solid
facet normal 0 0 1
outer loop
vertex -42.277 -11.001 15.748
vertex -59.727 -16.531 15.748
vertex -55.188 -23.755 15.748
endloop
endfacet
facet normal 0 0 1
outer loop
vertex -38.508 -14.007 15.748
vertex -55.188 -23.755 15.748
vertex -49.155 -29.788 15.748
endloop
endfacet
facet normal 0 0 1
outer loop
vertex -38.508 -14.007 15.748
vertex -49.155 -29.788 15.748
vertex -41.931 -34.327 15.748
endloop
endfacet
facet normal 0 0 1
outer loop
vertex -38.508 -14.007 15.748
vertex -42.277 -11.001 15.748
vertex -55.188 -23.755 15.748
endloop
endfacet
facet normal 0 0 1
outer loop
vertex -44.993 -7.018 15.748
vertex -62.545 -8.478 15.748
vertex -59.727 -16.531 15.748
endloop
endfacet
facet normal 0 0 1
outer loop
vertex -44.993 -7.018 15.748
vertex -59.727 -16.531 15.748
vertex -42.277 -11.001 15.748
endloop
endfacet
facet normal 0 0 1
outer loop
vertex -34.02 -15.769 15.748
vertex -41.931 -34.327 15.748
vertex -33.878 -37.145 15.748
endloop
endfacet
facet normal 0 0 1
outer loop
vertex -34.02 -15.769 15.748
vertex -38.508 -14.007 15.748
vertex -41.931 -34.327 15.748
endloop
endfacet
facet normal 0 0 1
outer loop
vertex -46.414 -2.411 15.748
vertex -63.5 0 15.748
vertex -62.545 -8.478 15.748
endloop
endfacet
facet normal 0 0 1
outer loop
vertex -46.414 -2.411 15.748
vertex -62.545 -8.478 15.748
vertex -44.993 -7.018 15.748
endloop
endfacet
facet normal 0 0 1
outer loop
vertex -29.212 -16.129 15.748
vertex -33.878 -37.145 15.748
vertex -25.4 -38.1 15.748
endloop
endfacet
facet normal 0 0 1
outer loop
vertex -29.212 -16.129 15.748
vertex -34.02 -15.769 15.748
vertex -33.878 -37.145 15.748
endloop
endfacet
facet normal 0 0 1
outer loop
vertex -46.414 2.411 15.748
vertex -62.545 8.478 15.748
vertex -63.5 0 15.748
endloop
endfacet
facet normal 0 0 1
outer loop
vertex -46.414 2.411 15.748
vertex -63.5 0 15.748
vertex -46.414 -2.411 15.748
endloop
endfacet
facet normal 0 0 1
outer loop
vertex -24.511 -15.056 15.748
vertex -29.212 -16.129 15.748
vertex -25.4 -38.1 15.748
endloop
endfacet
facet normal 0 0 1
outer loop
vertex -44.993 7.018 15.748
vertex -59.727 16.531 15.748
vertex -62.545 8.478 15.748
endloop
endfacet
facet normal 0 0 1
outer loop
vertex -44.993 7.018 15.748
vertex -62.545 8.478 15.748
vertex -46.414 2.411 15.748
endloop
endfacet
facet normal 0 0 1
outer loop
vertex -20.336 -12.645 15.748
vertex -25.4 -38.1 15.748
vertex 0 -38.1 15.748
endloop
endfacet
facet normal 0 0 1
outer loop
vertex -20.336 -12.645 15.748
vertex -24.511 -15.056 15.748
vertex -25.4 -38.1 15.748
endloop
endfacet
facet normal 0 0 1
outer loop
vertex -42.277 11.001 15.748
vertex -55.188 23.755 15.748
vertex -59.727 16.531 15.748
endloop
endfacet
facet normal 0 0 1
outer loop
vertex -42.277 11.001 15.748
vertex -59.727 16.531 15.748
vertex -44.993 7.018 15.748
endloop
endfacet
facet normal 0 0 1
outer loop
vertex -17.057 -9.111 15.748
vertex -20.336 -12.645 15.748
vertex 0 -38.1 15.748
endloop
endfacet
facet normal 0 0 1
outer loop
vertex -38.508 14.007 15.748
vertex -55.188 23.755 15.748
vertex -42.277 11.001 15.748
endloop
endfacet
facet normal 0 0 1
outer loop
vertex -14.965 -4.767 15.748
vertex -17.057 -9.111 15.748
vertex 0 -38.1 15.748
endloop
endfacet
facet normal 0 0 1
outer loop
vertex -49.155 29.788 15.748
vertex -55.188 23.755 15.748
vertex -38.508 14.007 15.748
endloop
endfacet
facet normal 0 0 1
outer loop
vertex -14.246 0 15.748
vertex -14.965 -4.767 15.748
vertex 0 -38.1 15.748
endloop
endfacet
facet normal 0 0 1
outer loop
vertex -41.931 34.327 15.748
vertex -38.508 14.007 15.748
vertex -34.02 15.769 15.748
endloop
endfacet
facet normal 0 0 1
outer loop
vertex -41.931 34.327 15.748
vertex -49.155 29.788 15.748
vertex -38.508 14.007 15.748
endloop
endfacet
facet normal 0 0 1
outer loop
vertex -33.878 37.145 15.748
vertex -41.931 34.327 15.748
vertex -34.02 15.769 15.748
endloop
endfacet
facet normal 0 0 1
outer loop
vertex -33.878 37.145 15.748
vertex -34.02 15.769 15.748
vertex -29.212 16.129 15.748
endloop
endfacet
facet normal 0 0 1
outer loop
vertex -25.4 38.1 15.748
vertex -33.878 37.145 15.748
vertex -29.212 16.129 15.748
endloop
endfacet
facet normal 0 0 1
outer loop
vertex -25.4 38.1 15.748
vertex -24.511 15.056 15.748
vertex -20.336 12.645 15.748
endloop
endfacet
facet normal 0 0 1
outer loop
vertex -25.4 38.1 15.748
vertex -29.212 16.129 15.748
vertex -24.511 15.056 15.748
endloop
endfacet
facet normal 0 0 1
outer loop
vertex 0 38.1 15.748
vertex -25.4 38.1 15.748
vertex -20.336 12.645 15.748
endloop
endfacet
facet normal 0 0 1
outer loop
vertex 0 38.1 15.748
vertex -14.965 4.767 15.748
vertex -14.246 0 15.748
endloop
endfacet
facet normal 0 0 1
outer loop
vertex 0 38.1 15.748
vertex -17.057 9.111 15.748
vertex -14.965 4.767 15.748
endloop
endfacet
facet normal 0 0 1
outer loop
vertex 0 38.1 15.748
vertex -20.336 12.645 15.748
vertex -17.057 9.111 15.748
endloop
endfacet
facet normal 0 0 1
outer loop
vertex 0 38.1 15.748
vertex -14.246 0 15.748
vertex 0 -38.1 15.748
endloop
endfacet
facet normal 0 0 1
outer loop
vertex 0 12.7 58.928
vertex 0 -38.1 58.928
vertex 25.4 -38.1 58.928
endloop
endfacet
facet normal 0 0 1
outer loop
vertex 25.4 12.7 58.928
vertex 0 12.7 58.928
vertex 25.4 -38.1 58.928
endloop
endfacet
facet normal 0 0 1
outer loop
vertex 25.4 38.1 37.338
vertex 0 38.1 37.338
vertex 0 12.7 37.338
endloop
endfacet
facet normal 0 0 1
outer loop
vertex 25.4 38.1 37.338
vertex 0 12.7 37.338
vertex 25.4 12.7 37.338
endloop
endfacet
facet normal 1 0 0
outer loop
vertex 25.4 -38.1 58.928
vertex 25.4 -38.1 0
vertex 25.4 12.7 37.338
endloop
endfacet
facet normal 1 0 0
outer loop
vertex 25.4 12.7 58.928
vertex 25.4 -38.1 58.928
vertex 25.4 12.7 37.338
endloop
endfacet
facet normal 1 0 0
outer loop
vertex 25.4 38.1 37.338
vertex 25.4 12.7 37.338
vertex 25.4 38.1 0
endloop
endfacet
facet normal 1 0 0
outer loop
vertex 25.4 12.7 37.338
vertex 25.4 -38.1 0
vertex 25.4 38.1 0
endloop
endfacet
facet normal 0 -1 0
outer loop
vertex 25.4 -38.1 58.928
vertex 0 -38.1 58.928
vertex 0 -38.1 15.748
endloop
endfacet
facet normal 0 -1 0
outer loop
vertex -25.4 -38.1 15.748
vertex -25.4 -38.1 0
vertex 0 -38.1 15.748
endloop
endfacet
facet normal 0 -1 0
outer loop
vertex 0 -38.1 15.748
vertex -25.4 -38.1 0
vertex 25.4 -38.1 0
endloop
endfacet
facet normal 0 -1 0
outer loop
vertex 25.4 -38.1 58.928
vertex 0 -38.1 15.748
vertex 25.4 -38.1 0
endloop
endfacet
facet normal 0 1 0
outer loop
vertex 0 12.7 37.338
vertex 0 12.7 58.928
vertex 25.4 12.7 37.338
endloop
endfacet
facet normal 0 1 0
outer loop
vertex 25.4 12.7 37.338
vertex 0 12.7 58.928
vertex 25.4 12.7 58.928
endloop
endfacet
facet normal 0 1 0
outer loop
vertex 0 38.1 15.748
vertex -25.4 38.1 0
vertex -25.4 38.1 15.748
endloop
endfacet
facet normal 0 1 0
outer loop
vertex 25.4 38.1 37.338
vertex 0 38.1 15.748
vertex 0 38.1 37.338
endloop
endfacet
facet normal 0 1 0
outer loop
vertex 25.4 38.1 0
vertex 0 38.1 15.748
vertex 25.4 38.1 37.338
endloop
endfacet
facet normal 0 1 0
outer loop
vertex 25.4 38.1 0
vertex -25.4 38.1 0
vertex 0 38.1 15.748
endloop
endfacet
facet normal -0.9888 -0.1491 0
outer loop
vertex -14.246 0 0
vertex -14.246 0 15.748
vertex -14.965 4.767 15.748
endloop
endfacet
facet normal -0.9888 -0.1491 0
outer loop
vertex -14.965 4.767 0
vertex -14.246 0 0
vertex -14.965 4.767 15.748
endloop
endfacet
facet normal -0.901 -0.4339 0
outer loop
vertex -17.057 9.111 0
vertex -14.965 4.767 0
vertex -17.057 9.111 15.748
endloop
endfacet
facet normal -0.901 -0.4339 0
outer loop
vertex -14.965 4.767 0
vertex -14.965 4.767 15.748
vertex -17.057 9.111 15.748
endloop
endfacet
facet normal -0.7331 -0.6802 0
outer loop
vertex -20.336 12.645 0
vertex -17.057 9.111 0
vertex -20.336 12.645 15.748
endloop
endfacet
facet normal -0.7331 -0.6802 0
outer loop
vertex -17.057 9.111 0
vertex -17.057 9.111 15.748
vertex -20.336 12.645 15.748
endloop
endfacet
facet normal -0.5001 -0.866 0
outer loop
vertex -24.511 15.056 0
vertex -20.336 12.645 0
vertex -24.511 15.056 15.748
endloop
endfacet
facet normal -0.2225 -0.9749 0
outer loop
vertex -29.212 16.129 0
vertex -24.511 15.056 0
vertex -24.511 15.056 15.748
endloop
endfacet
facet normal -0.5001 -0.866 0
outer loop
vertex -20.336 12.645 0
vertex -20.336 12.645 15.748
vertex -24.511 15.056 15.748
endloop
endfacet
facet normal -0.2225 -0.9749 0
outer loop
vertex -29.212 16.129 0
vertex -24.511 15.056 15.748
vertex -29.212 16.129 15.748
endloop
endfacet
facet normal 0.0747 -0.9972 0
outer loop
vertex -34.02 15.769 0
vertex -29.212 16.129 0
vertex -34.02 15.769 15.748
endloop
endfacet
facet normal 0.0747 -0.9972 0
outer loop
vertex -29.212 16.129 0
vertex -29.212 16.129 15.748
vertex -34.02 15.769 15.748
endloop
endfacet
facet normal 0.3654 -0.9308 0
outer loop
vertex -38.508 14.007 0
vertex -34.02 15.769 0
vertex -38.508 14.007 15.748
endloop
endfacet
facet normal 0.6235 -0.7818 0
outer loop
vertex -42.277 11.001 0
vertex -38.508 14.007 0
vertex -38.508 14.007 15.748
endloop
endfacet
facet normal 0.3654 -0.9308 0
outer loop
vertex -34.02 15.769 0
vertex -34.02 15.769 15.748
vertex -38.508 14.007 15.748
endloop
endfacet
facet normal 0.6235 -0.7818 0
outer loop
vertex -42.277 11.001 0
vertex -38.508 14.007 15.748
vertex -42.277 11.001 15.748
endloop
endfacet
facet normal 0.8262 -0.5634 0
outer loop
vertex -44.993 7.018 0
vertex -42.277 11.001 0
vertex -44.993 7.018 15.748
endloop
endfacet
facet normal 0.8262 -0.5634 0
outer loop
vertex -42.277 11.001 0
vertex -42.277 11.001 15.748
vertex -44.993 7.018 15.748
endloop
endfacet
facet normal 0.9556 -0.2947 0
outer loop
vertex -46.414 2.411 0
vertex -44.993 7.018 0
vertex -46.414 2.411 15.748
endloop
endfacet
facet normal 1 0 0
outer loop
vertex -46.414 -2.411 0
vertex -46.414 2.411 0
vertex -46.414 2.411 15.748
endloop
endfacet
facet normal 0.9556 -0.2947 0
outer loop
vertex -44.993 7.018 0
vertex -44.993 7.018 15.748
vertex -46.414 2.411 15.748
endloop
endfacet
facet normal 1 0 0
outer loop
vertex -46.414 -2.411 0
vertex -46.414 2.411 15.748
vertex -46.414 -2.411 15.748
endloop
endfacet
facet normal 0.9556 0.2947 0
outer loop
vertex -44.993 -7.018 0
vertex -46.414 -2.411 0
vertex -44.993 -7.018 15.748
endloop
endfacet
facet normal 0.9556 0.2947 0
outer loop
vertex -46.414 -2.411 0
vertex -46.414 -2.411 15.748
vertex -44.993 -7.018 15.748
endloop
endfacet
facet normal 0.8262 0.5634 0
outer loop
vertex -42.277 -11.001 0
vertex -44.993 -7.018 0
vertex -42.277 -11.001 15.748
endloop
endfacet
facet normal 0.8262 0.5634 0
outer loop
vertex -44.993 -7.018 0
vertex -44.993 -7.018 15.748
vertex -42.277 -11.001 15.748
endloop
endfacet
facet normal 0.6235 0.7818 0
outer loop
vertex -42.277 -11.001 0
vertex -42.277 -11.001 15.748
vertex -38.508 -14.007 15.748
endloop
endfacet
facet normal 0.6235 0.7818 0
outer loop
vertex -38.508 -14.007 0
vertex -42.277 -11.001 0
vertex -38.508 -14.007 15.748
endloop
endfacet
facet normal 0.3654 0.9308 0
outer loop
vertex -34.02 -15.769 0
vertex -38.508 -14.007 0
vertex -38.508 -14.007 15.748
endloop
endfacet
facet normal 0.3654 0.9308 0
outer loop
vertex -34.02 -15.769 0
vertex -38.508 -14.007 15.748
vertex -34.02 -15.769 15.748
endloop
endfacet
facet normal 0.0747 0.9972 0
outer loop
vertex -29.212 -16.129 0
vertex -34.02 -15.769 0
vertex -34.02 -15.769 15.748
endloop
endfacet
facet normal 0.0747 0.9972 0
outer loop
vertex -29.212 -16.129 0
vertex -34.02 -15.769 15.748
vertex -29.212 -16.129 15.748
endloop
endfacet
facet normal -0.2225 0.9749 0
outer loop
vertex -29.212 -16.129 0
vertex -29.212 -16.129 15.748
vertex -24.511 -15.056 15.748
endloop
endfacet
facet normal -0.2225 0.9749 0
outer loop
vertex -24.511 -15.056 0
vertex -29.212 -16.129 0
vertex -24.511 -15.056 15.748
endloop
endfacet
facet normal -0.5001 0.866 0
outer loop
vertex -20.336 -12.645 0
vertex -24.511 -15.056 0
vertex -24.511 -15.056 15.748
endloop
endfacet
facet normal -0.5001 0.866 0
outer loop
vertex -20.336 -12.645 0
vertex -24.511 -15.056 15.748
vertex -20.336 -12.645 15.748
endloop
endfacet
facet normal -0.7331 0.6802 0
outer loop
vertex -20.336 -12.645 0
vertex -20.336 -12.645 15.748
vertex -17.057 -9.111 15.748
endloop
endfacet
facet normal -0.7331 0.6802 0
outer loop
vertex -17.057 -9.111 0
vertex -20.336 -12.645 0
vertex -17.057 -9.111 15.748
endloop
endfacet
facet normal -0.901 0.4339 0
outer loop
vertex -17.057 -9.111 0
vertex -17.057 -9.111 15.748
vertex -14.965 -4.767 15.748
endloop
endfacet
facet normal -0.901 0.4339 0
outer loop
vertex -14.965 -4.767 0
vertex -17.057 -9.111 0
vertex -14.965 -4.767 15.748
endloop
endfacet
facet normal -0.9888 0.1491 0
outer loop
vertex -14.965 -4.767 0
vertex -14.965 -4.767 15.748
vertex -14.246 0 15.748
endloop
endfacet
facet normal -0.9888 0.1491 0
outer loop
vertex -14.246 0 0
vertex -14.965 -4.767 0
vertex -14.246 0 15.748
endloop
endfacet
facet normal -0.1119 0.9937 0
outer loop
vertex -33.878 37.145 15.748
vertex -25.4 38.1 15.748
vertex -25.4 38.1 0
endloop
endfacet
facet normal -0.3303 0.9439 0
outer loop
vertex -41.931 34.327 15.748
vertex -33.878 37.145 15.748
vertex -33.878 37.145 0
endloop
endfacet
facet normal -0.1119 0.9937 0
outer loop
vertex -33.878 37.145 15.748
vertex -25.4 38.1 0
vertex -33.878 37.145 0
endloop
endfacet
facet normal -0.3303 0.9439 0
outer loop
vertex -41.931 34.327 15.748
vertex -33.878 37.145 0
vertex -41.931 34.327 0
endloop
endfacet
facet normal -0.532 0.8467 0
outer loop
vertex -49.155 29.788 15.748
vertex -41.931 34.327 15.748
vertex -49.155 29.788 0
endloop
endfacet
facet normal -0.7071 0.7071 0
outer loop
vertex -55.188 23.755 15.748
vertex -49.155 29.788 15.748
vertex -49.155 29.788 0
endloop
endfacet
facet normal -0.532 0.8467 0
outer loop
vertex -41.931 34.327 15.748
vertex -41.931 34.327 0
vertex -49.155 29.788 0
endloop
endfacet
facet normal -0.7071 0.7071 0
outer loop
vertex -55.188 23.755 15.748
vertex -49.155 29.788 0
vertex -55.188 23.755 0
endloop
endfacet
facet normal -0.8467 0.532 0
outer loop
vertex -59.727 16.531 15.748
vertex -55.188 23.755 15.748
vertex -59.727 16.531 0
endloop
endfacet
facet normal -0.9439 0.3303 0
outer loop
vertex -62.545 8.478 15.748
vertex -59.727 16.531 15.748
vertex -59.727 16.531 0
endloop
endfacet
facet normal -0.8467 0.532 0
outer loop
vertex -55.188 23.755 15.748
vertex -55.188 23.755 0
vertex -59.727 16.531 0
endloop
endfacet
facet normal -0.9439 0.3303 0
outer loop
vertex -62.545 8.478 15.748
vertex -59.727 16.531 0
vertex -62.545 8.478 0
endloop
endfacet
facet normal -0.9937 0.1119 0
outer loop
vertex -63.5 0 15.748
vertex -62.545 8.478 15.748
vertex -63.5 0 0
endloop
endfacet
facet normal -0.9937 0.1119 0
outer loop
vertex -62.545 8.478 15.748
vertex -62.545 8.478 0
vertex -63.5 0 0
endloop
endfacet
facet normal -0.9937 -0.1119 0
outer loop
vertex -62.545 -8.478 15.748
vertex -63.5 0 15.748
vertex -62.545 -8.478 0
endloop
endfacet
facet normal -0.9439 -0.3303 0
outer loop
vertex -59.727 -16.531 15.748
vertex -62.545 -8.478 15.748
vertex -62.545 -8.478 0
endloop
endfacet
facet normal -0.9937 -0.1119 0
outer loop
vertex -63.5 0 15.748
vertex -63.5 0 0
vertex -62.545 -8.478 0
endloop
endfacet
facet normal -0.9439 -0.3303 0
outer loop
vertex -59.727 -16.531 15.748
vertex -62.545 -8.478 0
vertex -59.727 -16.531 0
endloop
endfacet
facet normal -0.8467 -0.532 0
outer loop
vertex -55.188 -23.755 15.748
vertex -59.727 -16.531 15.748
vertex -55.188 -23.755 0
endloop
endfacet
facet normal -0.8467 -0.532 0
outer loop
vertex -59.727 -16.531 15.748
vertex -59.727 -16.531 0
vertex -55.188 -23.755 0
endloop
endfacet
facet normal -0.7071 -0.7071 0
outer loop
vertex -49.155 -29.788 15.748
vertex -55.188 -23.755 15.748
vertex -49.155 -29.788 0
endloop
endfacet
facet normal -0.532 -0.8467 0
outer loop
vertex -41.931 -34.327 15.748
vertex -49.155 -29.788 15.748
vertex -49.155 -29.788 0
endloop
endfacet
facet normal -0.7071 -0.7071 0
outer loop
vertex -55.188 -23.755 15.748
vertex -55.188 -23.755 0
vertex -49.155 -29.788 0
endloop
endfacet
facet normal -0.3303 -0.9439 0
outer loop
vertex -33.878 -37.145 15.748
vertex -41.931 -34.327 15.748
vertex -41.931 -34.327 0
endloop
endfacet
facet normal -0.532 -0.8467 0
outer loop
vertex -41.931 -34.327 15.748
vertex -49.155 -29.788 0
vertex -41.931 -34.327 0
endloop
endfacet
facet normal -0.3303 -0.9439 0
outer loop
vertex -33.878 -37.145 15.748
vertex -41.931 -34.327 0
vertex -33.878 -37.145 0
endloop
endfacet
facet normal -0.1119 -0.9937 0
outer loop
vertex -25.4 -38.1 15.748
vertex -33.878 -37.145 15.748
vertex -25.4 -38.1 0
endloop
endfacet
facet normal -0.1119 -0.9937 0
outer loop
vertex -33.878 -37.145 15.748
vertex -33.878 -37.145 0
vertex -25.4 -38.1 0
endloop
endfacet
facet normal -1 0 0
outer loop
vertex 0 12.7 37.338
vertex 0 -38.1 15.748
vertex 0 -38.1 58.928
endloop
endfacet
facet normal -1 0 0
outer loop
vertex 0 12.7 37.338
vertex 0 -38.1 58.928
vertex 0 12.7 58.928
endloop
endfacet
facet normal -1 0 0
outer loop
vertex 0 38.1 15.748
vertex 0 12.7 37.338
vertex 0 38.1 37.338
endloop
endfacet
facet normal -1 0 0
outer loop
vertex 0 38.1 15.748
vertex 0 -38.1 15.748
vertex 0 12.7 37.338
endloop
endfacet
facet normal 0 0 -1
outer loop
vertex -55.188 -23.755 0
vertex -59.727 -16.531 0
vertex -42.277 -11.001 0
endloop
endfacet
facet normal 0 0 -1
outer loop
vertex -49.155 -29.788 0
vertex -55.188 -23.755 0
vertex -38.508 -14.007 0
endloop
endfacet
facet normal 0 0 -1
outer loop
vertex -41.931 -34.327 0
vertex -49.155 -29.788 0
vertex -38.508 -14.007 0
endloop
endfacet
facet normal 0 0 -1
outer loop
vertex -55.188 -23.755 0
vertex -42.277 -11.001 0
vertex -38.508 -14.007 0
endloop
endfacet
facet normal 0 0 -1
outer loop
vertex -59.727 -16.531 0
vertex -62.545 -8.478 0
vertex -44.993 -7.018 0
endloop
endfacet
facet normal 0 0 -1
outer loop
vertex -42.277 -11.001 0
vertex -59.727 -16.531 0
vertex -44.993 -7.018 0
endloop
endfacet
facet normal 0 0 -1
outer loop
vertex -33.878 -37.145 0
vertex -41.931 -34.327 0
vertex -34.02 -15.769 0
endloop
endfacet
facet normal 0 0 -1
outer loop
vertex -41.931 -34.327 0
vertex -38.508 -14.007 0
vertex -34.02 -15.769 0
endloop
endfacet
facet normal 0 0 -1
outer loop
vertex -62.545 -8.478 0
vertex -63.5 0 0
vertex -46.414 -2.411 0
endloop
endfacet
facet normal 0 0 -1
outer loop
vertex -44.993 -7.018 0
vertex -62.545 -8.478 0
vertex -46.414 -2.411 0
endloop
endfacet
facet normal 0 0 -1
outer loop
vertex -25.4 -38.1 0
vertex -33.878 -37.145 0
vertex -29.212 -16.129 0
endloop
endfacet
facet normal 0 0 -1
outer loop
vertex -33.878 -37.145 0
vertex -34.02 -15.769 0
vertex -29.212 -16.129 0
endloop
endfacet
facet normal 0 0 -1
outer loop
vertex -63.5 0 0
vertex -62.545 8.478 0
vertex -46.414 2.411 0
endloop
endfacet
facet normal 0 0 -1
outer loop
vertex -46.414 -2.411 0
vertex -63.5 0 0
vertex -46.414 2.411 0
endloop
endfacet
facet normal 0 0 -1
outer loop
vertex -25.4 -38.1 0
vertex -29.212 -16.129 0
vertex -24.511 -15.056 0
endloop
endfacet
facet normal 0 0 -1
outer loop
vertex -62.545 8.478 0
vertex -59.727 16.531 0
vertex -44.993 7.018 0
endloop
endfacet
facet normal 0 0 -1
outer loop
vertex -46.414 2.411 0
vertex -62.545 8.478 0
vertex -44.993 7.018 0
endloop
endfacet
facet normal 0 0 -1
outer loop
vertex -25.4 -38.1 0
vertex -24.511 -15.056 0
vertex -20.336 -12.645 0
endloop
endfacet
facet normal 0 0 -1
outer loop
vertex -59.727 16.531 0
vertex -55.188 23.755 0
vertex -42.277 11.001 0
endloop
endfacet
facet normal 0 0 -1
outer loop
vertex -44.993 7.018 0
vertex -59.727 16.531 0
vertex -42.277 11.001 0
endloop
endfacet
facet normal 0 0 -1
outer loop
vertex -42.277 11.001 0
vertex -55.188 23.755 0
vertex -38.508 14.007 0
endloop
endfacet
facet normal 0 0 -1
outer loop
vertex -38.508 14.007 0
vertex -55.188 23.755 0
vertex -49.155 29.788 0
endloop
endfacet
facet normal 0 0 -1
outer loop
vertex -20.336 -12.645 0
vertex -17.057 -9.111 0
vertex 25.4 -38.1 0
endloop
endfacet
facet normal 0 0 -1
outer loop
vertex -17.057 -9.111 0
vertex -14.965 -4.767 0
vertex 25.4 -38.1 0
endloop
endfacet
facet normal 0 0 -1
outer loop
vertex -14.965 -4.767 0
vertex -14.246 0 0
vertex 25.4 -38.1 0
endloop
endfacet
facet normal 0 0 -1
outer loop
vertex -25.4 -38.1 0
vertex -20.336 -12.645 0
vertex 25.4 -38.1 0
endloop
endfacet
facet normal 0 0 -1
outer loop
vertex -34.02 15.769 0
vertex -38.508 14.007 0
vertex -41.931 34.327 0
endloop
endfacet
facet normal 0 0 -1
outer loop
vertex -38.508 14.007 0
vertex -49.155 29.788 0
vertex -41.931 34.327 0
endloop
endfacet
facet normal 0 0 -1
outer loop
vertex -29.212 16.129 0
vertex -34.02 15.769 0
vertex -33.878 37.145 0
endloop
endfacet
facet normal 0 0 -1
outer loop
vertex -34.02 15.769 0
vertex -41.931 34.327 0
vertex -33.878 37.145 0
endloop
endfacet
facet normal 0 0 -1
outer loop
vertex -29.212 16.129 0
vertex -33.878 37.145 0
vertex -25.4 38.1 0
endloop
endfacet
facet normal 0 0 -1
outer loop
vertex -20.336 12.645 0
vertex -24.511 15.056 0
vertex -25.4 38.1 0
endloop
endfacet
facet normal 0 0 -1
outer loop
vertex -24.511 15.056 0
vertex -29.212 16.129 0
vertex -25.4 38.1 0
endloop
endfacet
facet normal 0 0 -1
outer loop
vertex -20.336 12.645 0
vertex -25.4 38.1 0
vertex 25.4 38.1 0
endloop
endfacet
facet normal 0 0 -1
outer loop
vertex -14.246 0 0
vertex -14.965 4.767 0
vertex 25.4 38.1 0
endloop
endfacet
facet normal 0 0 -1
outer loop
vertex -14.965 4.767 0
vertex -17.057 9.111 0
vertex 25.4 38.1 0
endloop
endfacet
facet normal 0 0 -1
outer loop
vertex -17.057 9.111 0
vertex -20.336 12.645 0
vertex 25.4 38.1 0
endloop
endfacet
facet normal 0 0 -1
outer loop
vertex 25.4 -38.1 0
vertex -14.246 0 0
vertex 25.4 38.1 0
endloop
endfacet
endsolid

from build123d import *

# Parameters (mm, degrees)
F0_W     = 50.8
F0_H     = 76.2
F1_DEPTH = 15.748
F2_R     = 16.174044
F3_DEPTH = 25.4
F4_W     = 25.4
F4_H     = 76.2
F5_DEPTH = 43.18
F6_W     = 25.4
F6_H     = 25.4
F7_DEPTH = 21.59


with BuildPart() as f1:
    # F0 (on Top) → F1 (new body)
    with BuildSketch(Plane.XY):
        Rectangle(F0_W, F0_H)
        with BuildLine():
            Line((-25.4, -38.1), (-25.4, 38.1))
            ThreePointArc((-25.4, 38.1), (-63.5, 0), (-25.4, -38.1))
        make_face()
    extrude(amount=F1_DEPTH)

    # F2 (on face) → F3 (cut)
    with BuildSketch(Plane.XY.offset(15.748)):
        with Locations((-30.42051, 0)):
            Circle(F2_R)
    extrude(amount=-F3_DEPTH, mode=Mode.SUBTRACT)

    # F4 (on face) → F5 (join)
    with BuildSketch(Plane.XY.offset(15.748)):
        with Locations((12.7, 0)):
            Rectangle(F4_W, F4_H)
    extrude(amount=F5_DEPTH)

    # F6 (on face) → F7 (cut)
    with BuildSketch(Plane.XY.offset(58.928)):
        with Locations((12.7, 25.4)):
            Rectangle(F6_W, F6_H)
    extrude(amount=-F7_DEPTH, mode=Mode.SUBTRACT)


solid = f1.part
